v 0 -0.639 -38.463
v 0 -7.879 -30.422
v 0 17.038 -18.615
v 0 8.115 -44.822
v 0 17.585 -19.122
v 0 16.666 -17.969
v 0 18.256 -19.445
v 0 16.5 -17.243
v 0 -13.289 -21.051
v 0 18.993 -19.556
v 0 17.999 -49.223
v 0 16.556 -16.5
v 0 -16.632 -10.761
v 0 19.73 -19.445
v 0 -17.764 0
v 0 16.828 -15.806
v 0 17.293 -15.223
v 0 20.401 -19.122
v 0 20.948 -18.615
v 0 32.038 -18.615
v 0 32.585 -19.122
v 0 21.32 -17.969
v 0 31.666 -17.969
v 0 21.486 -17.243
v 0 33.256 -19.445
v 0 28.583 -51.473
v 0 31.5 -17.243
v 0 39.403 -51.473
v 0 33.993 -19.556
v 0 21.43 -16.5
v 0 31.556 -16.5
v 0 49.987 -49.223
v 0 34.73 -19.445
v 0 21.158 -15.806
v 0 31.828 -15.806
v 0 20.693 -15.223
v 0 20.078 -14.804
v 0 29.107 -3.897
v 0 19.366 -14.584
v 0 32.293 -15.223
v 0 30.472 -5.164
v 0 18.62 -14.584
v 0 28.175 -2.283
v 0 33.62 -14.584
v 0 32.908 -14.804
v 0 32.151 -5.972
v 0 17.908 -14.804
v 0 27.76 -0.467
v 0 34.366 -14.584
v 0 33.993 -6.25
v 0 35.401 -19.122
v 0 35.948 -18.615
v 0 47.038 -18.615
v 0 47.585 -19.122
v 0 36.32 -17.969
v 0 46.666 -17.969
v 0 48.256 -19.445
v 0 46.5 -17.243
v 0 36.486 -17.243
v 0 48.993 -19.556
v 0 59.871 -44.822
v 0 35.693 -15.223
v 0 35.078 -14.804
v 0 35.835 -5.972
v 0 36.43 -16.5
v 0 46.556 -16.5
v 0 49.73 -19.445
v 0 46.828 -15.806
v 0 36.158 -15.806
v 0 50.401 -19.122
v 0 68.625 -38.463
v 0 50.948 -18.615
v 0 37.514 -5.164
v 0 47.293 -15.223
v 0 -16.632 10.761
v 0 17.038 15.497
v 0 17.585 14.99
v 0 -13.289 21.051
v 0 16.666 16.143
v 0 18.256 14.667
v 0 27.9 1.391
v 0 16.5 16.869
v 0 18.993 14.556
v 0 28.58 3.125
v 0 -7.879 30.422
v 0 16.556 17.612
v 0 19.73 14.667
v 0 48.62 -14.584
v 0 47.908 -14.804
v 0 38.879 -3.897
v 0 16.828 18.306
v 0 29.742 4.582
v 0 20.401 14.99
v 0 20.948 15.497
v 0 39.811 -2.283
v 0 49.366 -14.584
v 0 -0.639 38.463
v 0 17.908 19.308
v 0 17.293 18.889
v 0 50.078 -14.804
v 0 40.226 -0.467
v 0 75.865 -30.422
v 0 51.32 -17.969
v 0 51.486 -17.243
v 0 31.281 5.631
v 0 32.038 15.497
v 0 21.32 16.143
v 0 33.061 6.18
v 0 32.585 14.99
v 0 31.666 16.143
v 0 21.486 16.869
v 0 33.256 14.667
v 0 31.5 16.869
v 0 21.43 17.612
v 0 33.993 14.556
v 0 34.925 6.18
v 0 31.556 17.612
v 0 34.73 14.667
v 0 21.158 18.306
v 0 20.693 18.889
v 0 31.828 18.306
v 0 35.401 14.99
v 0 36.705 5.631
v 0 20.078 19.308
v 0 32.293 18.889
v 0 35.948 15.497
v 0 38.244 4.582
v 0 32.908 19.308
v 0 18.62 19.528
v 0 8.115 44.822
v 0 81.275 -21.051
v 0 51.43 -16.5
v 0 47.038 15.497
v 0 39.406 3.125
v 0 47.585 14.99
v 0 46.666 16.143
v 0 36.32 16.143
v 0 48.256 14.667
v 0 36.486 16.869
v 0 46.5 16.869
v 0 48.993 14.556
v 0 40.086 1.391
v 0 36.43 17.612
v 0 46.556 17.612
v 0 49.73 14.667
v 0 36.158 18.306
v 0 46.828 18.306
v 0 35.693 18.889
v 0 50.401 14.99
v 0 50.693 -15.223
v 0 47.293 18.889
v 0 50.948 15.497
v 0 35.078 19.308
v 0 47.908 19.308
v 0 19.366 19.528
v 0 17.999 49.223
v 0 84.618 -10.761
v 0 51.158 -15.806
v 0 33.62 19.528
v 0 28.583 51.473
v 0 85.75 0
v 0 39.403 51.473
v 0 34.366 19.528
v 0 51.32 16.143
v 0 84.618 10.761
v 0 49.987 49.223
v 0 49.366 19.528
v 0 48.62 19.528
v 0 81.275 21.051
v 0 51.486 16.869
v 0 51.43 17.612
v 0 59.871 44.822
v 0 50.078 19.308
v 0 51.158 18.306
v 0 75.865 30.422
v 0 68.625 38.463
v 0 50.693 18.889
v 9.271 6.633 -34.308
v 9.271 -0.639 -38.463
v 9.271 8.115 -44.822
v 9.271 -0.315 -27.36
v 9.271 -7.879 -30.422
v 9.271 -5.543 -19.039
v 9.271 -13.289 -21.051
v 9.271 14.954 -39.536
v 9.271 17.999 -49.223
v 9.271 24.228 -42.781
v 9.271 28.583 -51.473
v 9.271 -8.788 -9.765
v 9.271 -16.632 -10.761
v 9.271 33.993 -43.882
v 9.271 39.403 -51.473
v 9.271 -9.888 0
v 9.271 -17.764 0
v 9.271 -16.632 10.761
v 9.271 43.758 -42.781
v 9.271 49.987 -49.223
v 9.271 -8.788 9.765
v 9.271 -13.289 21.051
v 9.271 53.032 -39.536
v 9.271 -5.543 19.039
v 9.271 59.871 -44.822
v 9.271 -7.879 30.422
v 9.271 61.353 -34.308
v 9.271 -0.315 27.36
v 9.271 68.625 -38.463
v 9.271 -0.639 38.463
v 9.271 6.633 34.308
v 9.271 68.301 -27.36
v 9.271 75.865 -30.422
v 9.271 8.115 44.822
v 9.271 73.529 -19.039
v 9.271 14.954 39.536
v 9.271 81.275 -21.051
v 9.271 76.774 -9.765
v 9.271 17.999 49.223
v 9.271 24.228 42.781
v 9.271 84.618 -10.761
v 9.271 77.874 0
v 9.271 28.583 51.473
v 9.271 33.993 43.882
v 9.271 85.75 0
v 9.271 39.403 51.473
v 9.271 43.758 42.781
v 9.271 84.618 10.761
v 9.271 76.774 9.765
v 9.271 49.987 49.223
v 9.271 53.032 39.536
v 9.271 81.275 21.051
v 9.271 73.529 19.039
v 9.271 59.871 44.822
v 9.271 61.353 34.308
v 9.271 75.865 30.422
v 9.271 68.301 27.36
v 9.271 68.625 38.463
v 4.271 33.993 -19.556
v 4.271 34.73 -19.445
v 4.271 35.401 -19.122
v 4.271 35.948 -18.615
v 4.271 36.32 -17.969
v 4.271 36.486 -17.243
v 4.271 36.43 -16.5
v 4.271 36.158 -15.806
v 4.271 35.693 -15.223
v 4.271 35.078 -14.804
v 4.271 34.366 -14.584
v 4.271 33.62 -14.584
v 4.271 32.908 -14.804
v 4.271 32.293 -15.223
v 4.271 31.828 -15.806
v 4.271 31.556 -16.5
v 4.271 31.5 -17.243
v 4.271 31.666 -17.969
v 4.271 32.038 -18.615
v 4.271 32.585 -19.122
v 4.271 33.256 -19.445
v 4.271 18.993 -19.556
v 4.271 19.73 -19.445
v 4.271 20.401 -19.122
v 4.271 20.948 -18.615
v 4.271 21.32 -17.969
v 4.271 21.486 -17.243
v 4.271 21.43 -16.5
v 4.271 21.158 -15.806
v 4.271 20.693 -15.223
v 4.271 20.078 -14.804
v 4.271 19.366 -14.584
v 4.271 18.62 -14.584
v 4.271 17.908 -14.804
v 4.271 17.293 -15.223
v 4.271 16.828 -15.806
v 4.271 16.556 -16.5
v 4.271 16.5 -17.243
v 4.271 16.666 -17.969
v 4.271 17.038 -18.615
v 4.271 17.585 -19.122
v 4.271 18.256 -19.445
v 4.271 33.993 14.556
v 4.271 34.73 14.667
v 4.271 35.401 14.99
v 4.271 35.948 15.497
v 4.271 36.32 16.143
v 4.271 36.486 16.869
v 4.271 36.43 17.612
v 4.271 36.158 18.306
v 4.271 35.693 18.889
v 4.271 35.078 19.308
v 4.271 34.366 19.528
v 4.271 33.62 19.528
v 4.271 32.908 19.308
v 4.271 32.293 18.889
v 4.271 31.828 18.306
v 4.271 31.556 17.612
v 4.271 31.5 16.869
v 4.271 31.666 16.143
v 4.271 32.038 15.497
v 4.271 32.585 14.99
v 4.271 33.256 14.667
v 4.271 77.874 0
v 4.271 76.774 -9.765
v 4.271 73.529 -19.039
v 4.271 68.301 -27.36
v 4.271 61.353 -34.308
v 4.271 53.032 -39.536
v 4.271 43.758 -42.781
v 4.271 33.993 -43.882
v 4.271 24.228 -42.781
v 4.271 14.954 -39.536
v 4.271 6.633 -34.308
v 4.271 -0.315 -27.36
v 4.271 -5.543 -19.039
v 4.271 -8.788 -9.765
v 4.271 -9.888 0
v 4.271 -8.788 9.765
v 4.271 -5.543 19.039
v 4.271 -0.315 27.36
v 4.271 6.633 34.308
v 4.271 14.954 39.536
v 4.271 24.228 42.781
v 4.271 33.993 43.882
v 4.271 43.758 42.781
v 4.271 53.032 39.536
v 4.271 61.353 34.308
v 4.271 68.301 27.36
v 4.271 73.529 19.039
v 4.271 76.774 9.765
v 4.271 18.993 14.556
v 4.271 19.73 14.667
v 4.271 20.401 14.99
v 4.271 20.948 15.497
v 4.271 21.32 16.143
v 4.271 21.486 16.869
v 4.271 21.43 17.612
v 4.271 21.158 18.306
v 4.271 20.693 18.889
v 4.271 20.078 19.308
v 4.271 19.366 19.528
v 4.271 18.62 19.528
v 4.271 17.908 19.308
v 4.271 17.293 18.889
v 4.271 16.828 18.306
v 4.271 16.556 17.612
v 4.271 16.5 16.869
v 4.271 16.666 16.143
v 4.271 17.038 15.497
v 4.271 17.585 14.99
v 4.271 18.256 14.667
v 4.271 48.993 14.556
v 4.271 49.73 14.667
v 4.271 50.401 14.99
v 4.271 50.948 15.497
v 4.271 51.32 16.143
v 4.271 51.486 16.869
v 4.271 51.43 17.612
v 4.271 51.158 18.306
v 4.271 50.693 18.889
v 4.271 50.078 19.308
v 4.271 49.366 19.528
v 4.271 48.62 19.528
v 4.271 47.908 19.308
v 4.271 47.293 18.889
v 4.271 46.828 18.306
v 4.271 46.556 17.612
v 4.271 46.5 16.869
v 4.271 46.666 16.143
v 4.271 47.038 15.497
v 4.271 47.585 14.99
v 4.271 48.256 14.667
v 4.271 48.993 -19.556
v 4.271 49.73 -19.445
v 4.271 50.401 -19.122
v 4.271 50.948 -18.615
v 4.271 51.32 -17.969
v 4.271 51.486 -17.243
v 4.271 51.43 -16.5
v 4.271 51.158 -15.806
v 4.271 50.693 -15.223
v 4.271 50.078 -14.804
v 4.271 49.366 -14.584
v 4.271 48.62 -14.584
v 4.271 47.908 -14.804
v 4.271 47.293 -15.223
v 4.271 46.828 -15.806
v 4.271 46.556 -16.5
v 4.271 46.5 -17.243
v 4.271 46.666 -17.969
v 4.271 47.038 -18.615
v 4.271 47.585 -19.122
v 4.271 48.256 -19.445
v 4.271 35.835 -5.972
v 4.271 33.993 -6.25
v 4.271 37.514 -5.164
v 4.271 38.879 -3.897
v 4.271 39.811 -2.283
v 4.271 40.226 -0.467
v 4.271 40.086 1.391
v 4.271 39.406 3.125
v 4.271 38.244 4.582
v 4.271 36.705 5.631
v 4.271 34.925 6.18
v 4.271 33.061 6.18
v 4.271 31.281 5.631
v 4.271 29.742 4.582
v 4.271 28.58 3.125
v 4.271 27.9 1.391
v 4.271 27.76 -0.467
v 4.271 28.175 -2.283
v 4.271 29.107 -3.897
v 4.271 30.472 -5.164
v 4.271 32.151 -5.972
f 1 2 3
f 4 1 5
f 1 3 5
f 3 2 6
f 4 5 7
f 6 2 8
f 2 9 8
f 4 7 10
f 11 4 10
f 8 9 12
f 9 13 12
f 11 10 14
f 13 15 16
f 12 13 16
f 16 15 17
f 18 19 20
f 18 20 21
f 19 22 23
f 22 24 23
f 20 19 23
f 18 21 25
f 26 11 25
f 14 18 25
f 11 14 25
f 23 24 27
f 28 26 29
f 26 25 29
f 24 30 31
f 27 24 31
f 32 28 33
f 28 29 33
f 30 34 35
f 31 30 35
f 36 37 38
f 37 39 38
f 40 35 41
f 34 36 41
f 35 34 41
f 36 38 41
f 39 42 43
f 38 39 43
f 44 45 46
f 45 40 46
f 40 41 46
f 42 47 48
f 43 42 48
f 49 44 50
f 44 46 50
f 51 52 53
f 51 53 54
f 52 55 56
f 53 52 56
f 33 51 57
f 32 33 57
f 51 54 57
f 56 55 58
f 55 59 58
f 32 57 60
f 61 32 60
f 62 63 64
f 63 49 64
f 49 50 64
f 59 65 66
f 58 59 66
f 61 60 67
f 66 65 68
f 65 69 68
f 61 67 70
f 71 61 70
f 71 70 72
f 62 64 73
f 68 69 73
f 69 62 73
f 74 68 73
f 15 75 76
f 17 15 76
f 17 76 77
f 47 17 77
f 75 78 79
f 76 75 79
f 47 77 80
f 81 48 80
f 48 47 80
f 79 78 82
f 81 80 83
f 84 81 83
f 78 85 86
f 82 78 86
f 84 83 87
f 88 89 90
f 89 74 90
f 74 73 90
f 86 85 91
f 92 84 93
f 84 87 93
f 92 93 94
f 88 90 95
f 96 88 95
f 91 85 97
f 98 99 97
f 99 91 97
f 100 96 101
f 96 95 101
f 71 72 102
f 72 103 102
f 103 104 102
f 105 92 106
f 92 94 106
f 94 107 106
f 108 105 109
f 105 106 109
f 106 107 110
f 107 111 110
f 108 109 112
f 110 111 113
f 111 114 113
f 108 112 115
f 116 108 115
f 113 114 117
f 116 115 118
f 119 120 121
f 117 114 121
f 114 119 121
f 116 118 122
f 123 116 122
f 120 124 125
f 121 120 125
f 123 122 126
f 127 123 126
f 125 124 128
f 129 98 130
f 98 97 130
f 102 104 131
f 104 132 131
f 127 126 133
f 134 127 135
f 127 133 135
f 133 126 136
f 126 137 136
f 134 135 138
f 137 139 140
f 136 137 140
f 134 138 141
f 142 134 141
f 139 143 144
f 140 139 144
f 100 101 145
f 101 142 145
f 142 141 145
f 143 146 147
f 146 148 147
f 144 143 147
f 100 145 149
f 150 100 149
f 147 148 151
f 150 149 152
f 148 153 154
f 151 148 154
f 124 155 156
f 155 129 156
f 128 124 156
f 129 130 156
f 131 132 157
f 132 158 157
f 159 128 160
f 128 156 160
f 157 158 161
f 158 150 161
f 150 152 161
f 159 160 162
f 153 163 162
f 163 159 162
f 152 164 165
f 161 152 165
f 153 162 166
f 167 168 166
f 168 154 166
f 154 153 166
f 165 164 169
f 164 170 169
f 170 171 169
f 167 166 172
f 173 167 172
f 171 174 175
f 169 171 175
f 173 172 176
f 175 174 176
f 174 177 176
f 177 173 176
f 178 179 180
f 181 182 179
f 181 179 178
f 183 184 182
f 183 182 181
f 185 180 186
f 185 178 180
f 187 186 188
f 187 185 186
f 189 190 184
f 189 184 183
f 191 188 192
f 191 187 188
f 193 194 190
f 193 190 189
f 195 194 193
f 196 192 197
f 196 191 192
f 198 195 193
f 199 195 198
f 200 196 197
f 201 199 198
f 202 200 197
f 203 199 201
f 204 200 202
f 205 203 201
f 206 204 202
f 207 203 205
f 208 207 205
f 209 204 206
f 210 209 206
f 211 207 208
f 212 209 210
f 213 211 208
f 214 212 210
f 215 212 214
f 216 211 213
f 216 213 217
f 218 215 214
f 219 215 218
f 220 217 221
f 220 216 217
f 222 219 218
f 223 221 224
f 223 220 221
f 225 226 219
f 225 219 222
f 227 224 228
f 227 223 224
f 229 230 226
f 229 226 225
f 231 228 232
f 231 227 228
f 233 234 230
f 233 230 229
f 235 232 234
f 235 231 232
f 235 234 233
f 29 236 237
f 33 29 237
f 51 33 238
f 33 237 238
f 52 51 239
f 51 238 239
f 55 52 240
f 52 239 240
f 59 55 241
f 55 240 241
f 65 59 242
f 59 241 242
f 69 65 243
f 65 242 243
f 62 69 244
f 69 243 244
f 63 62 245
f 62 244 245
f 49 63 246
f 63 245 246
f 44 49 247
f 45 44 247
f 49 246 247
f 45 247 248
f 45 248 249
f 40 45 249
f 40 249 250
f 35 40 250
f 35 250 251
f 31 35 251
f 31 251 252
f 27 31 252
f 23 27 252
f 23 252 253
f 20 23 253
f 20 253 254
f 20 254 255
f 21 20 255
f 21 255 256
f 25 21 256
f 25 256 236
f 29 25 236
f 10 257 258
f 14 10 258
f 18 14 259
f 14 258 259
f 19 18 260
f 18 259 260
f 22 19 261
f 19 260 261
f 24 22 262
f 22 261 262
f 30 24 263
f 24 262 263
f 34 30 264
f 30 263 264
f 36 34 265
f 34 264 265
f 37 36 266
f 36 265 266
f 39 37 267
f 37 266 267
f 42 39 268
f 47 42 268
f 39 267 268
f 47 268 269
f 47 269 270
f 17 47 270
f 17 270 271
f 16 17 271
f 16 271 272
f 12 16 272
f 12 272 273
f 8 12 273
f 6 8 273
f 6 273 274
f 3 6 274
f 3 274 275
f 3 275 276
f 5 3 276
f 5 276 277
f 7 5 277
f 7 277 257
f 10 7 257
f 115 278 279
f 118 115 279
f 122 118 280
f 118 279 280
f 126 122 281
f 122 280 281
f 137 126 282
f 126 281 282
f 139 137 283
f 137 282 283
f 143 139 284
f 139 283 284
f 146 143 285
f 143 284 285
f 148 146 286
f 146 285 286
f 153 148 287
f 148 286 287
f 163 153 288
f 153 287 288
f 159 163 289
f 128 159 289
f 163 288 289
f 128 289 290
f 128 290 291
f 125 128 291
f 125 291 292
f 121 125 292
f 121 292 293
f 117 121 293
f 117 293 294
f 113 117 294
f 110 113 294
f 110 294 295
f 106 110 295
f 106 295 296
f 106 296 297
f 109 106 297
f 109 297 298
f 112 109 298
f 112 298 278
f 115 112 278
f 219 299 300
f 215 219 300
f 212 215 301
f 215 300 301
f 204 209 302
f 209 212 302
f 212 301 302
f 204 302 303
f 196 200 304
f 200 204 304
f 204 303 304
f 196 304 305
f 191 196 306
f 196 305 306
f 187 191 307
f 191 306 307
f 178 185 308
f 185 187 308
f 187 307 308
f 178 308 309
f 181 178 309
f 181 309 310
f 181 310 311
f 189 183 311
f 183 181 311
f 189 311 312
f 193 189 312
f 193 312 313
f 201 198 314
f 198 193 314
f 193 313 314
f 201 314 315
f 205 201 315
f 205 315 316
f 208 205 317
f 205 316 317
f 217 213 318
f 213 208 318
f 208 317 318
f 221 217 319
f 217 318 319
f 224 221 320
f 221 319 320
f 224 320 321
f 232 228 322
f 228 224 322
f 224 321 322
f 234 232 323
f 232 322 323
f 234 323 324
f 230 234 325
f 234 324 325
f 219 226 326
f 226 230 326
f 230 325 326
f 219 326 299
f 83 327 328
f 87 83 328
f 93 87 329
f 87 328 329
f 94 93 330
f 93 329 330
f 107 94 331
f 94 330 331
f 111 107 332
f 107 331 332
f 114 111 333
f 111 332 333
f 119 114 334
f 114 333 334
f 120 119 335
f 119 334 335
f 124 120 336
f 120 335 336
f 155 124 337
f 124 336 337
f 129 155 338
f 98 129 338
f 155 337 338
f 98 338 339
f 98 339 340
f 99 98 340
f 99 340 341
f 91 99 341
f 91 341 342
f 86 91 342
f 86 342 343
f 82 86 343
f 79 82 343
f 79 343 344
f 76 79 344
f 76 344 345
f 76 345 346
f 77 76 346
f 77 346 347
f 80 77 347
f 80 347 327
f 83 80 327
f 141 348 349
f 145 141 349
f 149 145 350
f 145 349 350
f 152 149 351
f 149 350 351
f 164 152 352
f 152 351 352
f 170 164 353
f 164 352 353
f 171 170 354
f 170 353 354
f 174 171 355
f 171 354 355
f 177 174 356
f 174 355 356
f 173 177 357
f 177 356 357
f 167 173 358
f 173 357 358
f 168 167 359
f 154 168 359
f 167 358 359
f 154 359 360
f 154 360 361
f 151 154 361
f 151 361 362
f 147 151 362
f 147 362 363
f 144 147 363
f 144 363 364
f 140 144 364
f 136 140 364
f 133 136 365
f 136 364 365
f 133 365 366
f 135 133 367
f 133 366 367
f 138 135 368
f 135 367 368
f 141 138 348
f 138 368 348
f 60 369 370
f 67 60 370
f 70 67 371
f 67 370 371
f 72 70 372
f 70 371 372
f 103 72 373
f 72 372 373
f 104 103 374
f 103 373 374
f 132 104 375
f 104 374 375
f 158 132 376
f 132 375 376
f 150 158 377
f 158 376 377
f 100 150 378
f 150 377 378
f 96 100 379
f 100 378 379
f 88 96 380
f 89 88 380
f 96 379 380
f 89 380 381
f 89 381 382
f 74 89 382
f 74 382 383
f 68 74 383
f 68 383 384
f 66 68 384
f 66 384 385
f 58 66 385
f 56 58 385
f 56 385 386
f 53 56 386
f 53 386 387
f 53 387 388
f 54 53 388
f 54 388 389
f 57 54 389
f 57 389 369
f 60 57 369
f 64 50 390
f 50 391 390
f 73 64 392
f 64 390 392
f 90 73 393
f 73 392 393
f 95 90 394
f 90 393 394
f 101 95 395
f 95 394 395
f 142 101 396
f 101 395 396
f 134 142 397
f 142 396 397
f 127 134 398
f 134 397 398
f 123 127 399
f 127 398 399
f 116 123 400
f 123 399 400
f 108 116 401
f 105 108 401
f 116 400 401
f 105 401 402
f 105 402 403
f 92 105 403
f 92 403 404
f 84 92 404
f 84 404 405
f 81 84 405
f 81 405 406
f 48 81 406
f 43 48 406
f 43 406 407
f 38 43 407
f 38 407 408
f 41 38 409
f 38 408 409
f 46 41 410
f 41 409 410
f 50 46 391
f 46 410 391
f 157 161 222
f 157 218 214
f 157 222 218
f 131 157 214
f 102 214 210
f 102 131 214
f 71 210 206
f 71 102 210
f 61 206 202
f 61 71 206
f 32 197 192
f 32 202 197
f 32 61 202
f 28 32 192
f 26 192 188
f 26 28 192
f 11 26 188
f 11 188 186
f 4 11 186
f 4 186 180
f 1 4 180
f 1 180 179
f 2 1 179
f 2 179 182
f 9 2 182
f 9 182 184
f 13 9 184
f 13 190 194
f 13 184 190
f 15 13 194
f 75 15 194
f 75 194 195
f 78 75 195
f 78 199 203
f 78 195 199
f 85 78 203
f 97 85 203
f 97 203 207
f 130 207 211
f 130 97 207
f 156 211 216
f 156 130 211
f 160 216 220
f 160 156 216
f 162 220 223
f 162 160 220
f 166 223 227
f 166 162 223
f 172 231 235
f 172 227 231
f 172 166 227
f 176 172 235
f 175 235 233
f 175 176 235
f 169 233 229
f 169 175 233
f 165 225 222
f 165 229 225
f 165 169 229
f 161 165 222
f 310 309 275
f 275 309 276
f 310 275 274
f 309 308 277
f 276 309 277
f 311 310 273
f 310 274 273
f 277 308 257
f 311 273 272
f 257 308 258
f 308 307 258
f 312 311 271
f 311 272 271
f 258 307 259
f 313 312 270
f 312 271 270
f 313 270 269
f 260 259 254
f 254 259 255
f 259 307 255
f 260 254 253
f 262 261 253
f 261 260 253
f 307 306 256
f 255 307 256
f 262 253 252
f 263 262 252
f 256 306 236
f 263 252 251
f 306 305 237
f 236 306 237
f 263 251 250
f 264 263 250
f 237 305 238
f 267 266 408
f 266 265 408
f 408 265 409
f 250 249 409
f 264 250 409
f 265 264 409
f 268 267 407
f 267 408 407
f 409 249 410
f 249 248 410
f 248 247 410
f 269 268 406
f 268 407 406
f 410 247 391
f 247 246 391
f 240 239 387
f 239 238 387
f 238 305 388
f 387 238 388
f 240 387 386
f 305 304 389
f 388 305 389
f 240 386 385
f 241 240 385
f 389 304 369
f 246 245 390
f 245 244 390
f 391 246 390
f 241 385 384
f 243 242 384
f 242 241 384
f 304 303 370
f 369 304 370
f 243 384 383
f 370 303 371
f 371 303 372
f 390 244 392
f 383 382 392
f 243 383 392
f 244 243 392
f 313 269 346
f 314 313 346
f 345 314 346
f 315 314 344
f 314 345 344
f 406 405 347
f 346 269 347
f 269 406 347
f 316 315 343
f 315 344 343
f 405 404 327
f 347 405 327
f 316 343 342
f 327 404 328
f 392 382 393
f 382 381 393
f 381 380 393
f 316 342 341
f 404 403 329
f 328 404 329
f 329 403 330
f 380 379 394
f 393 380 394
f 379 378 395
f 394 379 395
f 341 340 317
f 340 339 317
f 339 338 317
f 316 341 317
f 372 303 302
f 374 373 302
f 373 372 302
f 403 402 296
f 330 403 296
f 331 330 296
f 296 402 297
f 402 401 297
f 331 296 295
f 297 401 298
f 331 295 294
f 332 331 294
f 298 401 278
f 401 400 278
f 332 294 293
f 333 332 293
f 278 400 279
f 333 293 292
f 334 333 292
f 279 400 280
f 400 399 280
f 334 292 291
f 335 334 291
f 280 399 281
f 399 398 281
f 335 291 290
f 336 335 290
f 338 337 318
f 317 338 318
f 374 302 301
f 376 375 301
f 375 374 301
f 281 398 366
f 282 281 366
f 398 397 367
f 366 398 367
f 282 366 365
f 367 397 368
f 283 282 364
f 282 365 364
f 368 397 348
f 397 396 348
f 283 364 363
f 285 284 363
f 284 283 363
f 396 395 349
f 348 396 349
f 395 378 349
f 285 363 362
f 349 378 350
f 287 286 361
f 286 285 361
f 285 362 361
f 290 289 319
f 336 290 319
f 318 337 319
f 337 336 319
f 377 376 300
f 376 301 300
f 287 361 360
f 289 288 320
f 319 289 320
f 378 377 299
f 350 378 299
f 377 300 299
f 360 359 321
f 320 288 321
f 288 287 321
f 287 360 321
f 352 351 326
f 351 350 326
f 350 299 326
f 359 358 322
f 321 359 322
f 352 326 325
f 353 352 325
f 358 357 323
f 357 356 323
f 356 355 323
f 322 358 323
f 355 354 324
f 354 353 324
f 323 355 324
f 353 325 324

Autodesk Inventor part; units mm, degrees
ref_plane "YZ Plane" through (0, 0, 0) normal (1, 0, 0) x (0, 1, 0)
ref_plane "XZ Plane" through (0, 0, 0) normal (0, 1, 0) x (-1, 0, 0)
ref_plane "XY Plane" through (0, 0, 0) normal (0, 0, 1) x (1, 0, 0)
sketch "Sketch1" plane through (0, 0, 0) normal (1, 0, 0) x (0, 1, 0)
  line L0 (0, 0) -> (0, -24.25)
  line L1 (0, 0) -> (0, 24.25)
  line L2 (0, 0) -> (33.993, 0)
  circle A0 centre (33.993, 0) radius 51.7565
  circle A1 centre (33.993, 0) radius 43.8815
  dimension "d0" = 24.25
  dimension "d1" = 24.25
  dimension "d2" = 33.993
  dimension "d3" = 103.513
  dimension "d17" = 87.763
extrude "Extrusion1" add sketch "Sketch1" along normal blind 9.271
sketch "Sketch5" plane through (0, 33.993, 0) normal (-1, 0, 0) x (0, 0, 1)
  circle A0 centre (0, 0) radius 43.8815
  point P0 (0, -33.993)
extrude "Extrusion5" add sketch "Sketch5" against normal blind 4.271
sketch "Sketch6" plane through (4.271, 33.993, 0) normal (1, 0, 0) x (0, 0, -1)
  line L0 (0, 0) -> (17.056, 0)
  line L1 (0, 0) -> (-17.056, 0)
  circle A0 centre (-17.056, 0) radius 2.5
  circle A1 centre (17.056, 0) radius 2.5
  circle A2 centre (0, 0) radius 6.25
  line L2 (-17.056, 0) -> (-17.056, -15)
  line L3 (-17.056, 0) -> (-17.056, 15)
  line L4 (17.056, 0) -> (17.056, 15)
  line L5 (17.056, 0) -> (17.056, -15)
  circle A3 centre (-17.056, 15) radius 2.5
  circle A4 centre (-17.056, -15) radius 2.5
  circle A5 centre (17.056, 15) radius 2.5
  circle A6 centre (17.056, -15) radius 2.5
  point P0 (0, -33.993)
  dimension "d22" = 17.056
  dimension "d23" = 17.056
  dimension "d24" = 5
  dimension "d25" = 5
  dimension "d26" = 12.5
  dimension "d29" = 15
  dimension "d30" = 15
  dimension "d31" = 15
  dimension "d32" = 15
  dimension "d33" = 5
  dimension "d34" = 5
  dimension "d35" = 5
  dimension "d36" = 5
extrude "Extrusion6" cut sketch "Sketch6" against normal blind 4.271
properties part number "4ax_plate_joint"
